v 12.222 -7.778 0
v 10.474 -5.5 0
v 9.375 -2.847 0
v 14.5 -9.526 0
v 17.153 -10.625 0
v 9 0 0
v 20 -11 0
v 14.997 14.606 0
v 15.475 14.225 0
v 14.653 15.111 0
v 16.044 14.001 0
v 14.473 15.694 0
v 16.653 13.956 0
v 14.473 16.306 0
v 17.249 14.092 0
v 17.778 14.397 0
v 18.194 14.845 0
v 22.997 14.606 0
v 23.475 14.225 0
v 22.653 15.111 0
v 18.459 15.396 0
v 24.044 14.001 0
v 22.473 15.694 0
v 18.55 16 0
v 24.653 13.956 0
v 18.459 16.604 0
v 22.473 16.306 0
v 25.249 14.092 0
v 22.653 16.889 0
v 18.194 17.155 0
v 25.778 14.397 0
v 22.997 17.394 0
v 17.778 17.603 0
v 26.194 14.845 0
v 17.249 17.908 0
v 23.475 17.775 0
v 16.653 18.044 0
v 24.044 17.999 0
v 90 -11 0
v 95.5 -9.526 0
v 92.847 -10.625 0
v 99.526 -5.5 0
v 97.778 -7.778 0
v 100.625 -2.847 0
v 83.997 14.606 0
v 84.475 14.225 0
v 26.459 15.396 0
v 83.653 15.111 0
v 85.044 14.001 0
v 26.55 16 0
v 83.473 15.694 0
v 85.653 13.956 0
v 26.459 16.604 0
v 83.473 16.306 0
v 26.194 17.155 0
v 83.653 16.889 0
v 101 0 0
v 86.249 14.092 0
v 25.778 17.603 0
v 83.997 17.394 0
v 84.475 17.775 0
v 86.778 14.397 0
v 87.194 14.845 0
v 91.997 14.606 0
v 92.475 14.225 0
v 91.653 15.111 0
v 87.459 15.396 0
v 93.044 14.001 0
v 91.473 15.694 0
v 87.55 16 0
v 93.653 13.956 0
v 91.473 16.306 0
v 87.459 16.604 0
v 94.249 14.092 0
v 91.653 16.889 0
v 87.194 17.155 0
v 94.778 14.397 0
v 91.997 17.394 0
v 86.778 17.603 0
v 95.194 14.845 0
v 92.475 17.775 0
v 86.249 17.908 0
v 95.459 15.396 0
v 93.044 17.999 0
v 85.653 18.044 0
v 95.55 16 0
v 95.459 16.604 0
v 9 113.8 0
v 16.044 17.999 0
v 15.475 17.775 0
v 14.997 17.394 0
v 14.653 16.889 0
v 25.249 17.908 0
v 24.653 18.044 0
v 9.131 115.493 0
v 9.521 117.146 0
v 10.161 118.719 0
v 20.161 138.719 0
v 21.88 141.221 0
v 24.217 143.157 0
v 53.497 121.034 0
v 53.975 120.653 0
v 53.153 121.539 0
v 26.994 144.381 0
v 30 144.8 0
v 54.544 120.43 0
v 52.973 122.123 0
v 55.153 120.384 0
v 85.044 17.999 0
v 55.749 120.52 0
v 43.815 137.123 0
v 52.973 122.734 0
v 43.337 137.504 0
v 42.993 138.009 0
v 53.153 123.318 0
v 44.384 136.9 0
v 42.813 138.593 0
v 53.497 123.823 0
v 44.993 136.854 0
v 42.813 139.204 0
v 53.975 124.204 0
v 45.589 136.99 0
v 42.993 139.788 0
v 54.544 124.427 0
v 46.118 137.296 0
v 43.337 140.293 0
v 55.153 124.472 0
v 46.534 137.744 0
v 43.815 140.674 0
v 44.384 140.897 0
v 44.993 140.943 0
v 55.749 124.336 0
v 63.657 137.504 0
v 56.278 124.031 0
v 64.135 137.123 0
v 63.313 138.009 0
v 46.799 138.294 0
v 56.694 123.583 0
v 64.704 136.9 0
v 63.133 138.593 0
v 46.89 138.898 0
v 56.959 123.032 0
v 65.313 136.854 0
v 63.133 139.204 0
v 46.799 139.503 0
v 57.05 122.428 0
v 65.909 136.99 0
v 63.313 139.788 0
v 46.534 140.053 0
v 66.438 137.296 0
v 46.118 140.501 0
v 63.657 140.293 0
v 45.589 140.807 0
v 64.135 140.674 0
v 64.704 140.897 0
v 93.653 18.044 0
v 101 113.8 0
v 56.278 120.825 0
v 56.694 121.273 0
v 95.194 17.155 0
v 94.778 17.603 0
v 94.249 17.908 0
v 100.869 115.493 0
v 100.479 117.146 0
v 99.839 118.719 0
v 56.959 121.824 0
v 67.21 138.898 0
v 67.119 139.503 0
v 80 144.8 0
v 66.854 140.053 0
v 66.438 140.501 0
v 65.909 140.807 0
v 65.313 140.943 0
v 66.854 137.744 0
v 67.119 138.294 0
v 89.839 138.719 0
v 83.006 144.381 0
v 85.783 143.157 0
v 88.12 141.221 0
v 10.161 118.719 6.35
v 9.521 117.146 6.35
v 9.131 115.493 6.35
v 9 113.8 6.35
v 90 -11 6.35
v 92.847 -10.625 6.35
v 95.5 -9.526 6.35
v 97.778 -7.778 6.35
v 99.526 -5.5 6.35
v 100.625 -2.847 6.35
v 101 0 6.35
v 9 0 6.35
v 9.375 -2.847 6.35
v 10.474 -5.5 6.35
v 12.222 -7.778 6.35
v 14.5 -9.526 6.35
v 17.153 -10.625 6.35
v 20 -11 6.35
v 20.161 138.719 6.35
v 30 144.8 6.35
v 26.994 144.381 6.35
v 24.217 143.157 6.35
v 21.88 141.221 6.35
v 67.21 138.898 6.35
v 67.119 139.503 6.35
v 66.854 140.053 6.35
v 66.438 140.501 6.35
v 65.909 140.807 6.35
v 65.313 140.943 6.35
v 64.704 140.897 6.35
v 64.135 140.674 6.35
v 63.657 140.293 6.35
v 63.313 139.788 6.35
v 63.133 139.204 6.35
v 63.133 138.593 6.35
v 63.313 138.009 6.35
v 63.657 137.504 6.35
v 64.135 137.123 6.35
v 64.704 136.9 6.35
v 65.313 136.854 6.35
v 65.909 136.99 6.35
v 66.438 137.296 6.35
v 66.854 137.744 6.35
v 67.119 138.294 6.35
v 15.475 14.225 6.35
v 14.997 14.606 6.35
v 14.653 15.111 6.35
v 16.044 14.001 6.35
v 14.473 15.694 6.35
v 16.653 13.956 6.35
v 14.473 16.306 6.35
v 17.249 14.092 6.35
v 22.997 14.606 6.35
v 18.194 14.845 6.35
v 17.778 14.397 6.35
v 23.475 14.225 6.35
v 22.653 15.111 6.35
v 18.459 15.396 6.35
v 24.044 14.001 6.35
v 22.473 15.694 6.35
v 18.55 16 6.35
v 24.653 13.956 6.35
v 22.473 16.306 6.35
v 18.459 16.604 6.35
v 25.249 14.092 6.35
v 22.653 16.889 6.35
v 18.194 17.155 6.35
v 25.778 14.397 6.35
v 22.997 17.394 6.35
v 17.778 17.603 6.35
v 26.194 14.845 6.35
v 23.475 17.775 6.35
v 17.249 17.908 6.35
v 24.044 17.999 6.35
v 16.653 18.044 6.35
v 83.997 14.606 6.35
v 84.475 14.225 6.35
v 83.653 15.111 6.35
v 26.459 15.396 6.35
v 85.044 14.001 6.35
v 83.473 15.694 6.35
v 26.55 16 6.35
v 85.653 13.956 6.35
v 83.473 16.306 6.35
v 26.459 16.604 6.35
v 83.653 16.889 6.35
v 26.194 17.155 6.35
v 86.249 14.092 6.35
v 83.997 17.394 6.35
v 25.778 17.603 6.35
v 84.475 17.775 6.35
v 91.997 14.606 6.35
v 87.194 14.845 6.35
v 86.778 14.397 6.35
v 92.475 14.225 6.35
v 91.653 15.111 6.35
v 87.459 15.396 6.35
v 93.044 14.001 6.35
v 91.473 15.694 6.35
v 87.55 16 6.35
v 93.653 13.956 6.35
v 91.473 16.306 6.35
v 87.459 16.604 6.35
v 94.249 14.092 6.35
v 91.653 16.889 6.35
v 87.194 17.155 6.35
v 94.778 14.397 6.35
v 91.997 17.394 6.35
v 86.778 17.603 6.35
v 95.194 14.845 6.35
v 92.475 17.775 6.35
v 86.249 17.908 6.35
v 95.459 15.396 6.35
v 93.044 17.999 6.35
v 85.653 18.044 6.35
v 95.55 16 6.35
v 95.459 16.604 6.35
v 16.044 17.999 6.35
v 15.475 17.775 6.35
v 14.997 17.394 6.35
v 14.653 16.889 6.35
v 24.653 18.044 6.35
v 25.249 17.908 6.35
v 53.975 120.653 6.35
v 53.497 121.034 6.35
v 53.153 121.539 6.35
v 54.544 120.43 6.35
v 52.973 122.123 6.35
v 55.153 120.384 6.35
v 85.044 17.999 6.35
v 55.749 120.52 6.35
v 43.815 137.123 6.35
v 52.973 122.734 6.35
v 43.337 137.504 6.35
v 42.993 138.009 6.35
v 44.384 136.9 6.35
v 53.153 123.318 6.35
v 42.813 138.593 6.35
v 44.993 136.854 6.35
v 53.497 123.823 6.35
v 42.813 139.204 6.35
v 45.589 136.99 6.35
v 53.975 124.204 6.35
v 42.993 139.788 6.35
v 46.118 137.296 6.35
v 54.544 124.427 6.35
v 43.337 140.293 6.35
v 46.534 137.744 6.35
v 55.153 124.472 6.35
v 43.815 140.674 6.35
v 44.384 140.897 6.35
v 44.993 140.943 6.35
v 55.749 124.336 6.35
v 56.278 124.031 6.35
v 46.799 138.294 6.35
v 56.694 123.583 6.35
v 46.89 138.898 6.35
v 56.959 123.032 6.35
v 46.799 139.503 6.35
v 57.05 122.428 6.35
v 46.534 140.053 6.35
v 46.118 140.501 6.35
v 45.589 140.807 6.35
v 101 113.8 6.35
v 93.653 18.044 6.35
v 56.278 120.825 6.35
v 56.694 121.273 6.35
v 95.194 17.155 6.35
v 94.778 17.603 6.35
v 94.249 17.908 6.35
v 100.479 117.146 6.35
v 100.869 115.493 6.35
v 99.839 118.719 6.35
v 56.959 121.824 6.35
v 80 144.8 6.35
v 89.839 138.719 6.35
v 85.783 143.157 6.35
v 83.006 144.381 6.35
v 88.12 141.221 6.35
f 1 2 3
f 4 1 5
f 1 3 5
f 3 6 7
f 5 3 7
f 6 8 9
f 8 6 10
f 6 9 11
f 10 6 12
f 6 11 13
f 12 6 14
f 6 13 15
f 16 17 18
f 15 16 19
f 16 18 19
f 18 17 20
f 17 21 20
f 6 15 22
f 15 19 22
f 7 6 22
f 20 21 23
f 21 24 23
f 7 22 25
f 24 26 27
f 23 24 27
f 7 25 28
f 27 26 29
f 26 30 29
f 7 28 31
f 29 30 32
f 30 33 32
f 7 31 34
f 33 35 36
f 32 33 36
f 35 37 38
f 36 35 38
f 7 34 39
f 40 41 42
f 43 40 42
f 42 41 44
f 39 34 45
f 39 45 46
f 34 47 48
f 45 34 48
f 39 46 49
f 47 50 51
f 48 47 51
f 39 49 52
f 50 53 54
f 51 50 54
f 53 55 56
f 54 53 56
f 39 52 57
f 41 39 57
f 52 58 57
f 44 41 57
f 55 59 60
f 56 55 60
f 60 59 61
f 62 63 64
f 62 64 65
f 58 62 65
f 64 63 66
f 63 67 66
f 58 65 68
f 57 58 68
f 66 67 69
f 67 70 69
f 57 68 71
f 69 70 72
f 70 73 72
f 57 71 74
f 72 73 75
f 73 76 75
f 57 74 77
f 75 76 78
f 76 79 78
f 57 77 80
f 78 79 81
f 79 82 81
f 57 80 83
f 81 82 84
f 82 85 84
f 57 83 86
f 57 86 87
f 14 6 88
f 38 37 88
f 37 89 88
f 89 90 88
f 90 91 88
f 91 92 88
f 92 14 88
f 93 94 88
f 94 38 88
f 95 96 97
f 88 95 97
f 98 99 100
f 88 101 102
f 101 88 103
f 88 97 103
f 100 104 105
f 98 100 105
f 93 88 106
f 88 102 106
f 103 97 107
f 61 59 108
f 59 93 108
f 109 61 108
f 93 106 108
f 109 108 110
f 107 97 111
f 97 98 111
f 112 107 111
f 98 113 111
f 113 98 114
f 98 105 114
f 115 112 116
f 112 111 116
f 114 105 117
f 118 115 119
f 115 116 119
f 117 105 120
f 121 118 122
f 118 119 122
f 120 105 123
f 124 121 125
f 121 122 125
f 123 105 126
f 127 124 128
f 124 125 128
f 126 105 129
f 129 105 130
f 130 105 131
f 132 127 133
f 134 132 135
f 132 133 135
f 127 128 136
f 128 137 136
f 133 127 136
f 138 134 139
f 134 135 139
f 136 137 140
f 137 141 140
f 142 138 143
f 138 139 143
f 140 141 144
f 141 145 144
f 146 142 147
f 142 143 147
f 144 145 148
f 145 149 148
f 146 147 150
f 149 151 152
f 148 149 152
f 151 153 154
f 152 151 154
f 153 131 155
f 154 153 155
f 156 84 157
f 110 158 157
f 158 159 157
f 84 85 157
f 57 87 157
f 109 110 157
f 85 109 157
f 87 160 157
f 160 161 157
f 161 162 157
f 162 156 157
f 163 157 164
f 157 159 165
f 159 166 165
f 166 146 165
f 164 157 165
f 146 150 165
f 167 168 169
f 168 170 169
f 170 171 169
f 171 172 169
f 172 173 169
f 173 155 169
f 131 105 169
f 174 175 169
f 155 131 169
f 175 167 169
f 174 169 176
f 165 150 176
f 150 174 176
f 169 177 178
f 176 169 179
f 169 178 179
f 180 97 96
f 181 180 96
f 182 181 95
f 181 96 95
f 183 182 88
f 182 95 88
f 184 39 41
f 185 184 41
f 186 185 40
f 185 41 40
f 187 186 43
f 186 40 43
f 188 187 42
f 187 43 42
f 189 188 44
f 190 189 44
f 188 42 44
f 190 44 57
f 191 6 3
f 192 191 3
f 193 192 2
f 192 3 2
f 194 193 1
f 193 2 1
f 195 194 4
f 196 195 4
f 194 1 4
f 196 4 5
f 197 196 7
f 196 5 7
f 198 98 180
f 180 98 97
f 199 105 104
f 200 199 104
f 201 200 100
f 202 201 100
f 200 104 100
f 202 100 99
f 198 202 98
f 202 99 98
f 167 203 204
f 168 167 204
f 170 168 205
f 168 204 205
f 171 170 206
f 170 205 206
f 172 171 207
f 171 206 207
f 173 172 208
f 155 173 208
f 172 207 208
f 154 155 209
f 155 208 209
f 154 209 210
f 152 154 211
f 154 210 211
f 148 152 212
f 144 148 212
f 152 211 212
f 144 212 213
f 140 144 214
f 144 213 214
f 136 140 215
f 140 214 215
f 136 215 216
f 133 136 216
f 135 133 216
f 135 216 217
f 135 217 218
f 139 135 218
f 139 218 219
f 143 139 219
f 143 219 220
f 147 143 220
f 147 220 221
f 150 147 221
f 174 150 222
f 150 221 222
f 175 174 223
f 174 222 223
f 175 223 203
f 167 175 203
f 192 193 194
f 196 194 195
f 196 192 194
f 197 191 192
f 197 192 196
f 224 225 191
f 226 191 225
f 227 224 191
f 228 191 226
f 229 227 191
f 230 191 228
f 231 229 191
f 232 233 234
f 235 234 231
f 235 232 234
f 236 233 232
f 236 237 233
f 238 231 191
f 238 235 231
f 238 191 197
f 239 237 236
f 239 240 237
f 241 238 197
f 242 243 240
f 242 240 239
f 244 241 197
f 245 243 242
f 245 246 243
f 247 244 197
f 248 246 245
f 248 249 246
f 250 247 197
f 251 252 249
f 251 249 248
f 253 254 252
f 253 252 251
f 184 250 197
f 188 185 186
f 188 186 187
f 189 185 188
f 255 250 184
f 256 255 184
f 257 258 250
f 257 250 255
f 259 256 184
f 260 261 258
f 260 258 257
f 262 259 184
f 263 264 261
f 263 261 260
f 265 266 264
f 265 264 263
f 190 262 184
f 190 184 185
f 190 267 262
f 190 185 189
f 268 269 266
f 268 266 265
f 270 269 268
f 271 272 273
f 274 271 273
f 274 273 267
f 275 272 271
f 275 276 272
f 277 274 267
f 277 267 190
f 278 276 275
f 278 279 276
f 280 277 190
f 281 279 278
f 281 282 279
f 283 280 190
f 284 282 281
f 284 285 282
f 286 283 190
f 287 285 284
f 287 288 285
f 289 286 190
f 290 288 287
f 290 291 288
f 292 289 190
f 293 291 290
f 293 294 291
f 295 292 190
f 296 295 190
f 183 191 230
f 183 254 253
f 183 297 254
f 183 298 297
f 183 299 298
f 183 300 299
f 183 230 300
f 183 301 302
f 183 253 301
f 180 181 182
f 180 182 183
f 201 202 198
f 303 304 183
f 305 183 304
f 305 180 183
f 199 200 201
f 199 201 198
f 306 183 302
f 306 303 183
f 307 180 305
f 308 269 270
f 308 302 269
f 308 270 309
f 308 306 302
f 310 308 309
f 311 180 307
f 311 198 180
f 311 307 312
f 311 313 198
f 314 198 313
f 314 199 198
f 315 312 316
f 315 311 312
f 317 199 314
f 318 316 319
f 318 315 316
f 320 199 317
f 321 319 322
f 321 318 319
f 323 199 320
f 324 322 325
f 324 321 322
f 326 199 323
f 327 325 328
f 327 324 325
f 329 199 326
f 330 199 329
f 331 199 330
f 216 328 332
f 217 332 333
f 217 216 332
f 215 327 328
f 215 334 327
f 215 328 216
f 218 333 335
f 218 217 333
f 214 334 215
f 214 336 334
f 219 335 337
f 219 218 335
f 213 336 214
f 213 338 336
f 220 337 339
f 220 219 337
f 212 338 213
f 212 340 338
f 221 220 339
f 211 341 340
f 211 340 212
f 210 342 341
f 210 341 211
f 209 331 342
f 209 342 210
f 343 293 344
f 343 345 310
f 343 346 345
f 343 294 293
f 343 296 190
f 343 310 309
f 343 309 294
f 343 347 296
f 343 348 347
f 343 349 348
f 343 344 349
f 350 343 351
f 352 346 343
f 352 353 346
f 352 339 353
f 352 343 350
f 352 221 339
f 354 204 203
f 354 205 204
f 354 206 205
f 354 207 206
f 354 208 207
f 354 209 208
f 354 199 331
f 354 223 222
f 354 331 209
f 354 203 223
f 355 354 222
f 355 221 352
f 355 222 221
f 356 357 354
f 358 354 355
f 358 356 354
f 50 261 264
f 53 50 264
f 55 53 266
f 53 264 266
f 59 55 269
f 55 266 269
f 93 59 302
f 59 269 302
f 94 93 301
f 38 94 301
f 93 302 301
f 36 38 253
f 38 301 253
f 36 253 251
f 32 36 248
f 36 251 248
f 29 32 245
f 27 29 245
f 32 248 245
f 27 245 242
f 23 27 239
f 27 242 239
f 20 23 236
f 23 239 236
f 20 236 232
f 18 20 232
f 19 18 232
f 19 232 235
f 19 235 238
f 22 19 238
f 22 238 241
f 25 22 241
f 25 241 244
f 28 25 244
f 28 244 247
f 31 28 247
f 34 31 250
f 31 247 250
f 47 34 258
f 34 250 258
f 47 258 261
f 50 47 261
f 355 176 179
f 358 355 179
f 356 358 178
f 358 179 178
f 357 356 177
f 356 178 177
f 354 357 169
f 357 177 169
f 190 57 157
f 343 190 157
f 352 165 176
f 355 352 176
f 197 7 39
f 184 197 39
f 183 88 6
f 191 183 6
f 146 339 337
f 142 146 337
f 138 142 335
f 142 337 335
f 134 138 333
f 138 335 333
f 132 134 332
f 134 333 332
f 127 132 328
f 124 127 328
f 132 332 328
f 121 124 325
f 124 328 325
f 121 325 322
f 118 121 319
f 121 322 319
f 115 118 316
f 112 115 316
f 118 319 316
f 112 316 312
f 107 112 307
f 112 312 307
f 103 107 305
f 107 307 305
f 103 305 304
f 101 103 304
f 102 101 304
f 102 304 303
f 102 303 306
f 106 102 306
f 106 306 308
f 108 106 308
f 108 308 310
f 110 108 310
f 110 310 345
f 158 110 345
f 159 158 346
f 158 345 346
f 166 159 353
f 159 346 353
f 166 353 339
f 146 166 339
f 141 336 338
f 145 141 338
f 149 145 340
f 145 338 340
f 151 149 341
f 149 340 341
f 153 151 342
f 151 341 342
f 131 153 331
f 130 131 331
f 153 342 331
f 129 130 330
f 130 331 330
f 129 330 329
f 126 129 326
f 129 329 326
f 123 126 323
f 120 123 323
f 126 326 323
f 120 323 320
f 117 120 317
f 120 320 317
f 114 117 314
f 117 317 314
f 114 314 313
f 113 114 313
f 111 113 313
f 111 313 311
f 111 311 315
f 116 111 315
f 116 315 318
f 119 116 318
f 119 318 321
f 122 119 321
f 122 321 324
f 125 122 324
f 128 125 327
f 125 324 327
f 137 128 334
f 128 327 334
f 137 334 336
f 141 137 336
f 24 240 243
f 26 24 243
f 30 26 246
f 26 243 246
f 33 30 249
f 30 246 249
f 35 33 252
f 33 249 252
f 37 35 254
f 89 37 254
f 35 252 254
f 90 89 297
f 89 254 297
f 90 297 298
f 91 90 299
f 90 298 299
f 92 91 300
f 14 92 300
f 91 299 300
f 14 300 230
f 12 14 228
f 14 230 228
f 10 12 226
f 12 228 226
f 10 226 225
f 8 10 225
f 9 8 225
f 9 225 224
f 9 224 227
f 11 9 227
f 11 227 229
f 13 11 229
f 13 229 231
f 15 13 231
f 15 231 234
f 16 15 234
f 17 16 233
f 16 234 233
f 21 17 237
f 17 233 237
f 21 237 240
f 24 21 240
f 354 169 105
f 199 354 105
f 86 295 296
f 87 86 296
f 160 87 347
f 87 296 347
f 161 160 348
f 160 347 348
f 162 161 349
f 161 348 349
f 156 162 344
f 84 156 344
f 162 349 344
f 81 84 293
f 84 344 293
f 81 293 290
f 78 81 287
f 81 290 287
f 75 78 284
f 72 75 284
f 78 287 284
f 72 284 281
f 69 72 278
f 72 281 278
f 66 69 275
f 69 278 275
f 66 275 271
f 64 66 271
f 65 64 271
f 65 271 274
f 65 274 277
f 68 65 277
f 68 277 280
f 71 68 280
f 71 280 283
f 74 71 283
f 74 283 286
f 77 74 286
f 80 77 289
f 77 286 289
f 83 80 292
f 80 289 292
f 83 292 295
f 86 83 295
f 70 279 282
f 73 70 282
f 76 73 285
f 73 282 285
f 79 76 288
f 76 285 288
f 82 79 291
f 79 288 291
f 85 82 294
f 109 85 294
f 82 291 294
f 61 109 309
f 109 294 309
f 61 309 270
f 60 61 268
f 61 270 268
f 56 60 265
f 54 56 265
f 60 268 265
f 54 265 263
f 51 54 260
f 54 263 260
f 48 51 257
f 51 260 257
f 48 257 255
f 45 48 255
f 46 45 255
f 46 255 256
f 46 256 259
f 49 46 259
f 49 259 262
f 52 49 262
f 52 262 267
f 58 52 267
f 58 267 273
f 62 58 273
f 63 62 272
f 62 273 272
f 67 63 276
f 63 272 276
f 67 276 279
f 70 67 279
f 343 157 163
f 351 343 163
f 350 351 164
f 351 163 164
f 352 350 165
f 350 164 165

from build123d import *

# Parameters (mm, degrees)
BOSS_EXTRUDE1_DEPTH = 6.35
SKETCH2_R           = 2.05
CUT_EXTRUDE1_DEPTH  = 6.35


with BuildPart() as part:
    # Sketch1 → Boss-Extrude1 (new body)
    with BuildSketch(Plane.XY):
        with BuildLine():
            Line((55, 144.8), (30, 144.8))
            ThreePointArc((30, 144.8), (24.216957767, 143.157158892), (20.161300899, 138.71934955))
            Line((20.161300899, 138.71934955), (10.161300899, 118.71934955))
            ThreePointArc((10.161300899, 118.71934955), (9.294261116, 116.327282126), (9, 113.8))
            Line((9, 113.8), (9, 0))
            ThreePointArc((9, 0), (12.221825407, -7.778174593), (20, -11))
            Line((20, -11), (90, -11))
            ThreePointArc((90, -11), (97.778174593, -7.778174593), (101, 0))
            Line((101, 0), (101, 113.8))
            ThreePointArc((101, 113.8), (100.705738884, 116.327282126), (99.838699101, 118.71934955))
            Line((99.838699101, 118.71934955), (89.838699101, 138.71934955))
            ThreePointArc((89.838699101, 138.71934955), (85.783042233, 143.157158892), (80, 144.8))
            Line((80, 144.8), (55, 144.8))
        make_face()
    extrude(amount=BOSS_EXTRUDE1_DEPTH)

    # Sketch2 → Cut-Extrude1 (cut)
    with BuildSketch(Plane.XY.offset(6.35)):
        with Locations((16.5, 16)):
            Circle(SKETCH2_R)
        with Locations((24.5, 16)):
            Circle(SKETCH2_R)
        with Locations((85.5, 16)):
            Circle(SKETCH2_R)
        with Locations((93.5, 16)):
            Circle(SKETCH2_R)
        with Locations((44.84, 138.898469816)):
            Circle(SKETCH2_R)
        with Locations((55, 122.428157316)):
            Circle(SKETCH2_R)
        with Locations((65.16, 138.898469816)):
            Circle(SKETCH2_R)
    extrude(amount=-CUT_EXTRUDE1_DEPTH, mode=Mode.SUBTRACT)


solid = part.part
